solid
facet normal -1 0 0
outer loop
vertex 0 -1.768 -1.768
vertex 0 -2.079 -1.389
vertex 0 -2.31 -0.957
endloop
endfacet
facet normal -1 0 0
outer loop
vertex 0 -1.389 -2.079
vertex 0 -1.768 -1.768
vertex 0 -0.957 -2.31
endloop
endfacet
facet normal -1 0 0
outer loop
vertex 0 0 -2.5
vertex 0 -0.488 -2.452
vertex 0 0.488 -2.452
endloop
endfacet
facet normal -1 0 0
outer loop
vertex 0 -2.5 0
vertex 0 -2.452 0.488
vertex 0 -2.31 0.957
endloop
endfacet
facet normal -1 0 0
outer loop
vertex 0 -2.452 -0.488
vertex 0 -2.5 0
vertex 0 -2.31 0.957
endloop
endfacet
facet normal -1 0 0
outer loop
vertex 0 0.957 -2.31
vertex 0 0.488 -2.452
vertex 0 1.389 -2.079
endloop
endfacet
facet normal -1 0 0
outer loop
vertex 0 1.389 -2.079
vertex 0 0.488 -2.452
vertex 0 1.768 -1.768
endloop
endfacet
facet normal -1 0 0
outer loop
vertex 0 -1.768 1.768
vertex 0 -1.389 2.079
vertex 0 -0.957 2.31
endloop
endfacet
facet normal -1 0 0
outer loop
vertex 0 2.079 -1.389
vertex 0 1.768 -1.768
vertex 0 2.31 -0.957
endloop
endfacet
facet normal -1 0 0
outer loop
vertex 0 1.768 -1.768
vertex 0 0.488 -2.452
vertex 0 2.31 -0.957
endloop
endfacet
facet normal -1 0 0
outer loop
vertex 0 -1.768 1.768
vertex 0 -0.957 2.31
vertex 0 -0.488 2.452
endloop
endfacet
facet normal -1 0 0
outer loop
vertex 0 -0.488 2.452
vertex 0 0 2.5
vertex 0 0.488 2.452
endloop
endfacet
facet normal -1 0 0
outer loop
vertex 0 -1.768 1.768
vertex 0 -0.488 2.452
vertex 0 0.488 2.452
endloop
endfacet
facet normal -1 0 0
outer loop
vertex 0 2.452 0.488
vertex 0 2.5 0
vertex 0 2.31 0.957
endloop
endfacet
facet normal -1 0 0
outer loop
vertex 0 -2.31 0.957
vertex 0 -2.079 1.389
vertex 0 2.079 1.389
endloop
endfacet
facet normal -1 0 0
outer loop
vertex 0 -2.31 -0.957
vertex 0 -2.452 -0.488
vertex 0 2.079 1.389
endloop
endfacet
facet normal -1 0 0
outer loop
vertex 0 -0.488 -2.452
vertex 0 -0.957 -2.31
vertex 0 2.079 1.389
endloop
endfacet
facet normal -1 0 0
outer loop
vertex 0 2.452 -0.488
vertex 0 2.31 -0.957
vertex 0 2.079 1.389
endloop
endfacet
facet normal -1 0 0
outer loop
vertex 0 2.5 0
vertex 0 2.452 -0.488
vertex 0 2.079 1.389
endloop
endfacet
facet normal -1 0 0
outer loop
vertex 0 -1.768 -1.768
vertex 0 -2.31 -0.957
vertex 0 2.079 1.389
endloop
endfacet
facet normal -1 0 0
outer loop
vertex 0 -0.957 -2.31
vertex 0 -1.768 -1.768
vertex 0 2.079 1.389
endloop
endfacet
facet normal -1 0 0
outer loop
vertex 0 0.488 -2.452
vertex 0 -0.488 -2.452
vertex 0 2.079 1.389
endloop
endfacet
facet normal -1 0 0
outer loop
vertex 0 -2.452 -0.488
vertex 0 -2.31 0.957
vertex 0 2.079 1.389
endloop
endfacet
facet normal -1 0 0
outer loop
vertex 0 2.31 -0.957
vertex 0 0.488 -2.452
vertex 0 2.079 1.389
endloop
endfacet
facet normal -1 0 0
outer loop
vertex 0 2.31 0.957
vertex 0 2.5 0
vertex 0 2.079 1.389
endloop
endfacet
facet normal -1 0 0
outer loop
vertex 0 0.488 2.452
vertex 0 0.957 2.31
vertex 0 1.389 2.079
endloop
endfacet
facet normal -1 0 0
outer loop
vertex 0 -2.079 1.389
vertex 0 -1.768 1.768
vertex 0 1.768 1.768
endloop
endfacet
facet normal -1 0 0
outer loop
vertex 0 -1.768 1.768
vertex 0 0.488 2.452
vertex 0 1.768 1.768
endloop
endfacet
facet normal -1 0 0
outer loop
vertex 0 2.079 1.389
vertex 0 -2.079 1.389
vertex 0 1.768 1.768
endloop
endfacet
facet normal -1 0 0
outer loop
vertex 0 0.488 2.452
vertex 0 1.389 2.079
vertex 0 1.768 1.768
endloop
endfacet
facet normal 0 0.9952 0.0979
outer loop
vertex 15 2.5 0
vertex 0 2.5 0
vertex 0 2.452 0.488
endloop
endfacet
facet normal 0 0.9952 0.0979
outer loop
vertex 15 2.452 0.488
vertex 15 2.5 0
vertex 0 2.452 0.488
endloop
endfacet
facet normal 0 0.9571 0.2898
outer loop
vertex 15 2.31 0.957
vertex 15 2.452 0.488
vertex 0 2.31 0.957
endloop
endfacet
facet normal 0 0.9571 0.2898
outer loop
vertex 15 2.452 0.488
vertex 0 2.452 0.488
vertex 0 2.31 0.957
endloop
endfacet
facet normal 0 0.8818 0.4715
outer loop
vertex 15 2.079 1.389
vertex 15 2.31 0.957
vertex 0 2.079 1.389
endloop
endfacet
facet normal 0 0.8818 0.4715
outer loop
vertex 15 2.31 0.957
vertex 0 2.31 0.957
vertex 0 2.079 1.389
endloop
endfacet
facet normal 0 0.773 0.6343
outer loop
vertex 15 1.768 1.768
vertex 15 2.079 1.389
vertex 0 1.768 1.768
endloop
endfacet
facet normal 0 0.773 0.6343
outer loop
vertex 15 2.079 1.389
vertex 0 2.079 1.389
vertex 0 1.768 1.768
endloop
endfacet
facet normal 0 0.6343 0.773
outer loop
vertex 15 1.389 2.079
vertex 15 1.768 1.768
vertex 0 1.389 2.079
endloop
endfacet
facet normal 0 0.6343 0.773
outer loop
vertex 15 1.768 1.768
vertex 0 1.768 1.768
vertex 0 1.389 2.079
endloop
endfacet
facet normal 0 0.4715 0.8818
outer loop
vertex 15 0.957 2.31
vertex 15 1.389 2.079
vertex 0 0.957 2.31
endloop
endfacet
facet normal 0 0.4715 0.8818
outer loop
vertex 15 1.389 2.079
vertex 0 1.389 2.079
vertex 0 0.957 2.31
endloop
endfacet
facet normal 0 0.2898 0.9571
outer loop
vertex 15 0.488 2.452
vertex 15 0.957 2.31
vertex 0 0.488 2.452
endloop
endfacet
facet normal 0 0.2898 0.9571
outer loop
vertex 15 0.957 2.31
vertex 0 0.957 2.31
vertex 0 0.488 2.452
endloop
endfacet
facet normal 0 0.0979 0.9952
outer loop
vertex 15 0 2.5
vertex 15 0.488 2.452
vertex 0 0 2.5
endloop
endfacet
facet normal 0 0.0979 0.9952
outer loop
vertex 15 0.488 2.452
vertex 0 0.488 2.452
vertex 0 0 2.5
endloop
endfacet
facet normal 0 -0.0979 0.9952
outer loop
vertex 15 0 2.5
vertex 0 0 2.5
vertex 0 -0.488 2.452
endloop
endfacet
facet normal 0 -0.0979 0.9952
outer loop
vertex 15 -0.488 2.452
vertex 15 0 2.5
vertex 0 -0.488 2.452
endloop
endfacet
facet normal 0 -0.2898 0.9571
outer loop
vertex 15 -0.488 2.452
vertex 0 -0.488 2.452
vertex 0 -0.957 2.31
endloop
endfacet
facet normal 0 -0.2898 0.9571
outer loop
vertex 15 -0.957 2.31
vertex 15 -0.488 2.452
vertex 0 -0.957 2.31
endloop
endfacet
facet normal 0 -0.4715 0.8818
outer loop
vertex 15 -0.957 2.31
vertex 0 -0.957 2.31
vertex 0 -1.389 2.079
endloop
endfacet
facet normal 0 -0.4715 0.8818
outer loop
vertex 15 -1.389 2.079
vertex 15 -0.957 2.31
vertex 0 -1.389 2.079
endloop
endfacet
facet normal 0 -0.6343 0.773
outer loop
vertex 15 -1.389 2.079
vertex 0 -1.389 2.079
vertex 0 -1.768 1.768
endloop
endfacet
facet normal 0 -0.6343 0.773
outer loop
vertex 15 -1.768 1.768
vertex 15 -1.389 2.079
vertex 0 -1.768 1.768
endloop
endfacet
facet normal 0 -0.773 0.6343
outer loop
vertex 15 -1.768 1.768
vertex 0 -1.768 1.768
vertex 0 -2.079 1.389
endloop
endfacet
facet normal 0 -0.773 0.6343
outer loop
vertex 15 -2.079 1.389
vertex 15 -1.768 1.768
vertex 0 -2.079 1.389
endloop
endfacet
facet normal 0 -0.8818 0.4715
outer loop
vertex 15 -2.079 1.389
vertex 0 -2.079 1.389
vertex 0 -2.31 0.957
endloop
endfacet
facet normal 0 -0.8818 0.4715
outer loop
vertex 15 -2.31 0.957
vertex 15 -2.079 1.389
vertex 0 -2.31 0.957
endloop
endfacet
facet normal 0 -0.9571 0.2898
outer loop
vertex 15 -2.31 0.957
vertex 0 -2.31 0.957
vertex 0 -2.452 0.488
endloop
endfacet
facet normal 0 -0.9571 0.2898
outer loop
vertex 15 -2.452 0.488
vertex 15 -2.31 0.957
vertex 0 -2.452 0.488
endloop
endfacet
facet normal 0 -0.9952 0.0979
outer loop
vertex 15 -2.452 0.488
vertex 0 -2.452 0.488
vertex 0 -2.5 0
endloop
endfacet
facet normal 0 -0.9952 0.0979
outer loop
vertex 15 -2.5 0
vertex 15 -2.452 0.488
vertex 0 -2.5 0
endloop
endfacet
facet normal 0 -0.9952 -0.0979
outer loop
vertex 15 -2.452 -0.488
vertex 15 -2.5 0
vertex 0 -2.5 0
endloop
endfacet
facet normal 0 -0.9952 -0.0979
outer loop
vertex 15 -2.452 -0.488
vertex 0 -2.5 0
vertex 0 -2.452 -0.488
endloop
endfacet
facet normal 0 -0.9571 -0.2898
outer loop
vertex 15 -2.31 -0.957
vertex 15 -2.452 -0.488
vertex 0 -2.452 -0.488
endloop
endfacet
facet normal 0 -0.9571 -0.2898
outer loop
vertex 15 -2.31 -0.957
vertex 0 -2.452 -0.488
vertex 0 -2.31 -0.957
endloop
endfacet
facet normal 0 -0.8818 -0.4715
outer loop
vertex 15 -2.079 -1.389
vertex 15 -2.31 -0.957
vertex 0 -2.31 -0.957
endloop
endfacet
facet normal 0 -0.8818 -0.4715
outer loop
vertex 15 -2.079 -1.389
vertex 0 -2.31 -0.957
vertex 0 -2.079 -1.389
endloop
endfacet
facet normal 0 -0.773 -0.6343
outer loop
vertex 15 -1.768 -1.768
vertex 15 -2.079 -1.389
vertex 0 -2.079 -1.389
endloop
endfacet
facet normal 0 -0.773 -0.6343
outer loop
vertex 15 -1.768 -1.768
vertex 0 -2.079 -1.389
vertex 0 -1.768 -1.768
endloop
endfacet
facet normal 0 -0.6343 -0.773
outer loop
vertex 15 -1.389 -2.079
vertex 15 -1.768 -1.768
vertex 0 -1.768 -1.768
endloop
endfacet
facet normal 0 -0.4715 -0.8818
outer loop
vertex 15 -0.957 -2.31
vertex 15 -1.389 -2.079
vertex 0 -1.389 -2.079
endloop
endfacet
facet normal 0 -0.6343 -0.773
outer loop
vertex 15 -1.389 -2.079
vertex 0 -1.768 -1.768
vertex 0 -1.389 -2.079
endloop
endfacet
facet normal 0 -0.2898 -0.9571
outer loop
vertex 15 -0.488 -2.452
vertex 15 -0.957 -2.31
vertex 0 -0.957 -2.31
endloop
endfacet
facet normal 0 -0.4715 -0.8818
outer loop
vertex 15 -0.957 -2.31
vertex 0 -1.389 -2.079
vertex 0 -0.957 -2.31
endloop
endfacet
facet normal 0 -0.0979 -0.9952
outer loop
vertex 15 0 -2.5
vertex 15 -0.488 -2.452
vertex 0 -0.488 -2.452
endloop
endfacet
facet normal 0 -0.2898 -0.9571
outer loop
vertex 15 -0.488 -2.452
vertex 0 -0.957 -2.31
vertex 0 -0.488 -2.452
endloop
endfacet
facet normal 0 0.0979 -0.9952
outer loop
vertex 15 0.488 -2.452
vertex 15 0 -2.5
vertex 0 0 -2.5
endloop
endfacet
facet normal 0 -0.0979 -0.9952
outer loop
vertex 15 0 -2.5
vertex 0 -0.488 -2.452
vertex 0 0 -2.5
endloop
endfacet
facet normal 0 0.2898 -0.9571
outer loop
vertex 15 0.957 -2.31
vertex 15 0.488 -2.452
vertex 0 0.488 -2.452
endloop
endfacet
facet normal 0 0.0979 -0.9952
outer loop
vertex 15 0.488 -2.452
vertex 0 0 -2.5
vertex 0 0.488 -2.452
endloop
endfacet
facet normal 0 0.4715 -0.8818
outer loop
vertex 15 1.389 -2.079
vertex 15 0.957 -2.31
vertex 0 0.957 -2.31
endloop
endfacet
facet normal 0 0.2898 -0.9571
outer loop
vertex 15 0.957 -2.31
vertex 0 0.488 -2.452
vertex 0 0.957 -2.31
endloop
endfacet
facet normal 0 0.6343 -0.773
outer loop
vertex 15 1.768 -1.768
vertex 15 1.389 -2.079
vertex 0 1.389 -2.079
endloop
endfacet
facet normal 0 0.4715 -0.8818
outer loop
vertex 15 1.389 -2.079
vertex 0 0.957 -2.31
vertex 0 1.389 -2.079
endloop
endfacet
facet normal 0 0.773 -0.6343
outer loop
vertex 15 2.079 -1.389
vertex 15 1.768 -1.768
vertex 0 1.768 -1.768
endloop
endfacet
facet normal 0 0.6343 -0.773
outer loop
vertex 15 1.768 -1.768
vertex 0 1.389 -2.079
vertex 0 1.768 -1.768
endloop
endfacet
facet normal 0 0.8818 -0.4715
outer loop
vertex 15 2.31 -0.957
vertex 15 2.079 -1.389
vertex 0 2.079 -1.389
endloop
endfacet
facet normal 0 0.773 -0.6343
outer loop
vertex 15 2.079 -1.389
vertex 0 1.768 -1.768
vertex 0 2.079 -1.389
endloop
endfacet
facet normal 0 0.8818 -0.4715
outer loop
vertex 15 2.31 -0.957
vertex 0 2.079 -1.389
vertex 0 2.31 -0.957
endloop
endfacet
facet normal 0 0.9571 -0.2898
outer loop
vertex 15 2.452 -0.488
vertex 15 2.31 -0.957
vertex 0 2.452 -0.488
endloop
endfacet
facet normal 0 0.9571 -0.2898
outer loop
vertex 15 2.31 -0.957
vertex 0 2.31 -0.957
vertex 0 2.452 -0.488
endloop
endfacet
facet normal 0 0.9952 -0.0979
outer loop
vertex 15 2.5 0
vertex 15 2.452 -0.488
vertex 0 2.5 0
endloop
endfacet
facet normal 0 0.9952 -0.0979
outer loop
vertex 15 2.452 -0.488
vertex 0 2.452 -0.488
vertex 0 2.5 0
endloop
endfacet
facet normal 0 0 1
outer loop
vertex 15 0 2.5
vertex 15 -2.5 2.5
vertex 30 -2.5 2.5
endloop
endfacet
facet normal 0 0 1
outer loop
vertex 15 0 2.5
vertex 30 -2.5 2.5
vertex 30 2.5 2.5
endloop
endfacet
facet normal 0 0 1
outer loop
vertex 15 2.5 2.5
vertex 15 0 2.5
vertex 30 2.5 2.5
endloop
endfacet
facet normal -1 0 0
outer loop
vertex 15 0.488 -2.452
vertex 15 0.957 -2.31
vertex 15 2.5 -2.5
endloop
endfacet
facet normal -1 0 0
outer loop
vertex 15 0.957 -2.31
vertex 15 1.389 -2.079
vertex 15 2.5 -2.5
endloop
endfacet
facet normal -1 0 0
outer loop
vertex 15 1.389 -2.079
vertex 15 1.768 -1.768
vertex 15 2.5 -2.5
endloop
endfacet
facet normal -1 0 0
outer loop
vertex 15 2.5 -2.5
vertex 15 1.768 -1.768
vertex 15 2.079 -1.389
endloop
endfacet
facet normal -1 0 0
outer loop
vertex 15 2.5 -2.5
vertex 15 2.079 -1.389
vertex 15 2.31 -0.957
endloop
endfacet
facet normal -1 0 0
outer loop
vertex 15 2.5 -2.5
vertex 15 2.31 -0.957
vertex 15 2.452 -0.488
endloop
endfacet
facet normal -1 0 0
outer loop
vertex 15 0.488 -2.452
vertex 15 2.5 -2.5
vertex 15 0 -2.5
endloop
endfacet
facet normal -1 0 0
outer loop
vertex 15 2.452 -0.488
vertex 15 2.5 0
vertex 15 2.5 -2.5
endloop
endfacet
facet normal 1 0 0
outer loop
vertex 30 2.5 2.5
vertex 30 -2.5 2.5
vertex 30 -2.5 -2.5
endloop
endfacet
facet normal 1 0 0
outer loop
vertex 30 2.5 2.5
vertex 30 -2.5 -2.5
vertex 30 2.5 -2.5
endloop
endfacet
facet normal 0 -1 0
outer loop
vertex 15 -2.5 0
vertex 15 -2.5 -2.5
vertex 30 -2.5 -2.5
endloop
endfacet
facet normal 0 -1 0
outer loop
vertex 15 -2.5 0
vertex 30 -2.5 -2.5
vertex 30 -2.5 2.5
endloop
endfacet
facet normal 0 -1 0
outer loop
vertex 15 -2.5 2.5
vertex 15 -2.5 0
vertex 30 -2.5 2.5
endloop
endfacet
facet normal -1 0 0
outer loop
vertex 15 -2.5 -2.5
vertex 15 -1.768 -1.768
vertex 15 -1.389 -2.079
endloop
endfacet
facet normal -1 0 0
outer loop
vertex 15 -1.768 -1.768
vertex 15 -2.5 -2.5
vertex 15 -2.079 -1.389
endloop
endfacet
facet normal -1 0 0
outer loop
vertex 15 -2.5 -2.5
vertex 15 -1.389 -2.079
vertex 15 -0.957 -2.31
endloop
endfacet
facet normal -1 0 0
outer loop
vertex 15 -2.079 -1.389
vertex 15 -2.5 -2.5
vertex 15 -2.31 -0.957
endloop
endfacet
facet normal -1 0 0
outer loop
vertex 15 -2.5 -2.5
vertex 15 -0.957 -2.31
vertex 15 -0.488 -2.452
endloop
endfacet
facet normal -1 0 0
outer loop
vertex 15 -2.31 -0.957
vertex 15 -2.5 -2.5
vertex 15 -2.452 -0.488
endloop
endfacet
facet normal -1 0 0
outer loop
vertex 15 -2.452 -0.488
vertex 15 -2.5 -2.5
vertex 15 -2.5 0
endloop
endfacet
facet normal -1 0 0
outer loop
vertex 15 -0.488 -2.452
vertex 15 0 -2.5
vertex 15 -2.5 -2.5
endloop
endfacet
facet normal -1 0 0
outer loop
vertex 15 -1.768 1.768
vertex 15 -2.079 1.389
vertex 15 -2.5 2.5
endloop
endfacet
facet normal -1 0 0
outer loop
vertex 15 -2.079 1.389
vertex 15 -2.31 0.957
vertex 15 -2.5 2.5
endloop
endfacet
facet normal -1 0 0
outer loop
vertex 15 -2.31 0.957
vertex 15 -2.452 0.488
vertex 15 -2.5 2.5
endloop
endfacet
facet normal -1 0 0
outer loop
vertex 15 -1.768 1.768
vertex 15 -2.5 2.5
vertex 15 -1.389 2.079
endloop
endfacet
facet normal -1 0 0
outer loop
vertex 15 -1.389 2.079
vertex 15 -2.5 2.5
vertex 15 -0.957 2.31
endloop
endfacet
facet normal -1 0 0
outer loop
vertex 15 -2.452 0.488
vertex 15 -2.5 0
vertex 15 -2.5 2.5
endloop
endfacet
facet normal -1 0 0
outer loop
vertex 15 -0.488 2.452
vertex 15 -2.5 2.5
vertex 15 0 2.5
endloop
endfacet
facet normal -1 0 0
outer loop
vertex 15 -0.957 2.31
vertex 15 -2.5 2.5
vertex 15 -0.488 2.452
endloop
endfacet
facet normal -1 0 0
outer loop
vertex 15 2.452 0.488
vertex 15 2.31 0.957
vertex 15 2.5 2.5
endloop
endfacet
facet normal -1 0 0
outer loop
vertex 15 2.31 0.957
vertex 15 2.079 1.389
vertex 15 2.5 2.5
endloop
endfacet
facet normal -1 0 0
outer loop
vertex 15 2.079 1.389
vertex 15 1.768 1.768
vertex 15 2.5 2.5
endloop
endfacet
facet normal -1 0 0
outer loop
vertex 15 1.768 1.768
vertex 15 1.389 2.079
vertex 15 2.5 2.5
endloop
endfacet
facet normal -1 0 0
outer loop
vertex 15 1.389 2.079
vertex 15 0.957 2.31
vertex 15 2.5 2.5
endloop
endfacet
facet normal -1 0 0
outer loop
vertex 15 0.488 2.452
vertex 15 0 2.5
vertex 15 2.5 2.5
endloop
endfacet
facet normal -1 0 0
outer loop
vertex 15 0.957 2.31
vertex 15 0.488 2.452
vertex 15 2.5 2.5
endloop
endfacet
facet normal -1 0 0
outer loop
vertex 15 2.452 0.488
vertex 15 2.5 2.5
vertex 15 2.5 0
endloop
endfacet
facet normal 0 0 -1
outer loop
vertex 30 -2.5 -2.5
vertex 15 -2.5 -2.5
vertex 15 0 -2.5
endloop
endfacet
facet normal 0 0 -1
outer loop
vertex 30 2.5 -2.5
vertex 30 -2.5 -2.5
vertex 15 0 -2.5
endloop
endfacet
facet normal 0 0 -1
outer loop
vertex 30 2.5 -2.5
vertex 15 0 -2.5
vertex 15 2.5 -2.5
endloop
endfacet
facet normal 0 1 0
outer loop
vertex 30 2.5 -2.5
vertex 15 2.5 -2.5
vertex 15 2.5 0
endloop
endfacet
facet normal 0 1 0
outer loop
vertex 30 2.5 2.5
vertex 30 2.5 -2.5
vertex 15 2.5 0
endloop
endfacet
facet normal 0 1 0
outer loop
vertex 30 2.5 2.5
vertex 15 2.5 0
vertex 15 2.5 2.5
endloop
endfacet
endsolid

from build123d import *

# Parameters (mm, degrees)
F0_R     = 2.5
F1_DEPTH = 15
F2_W     = 5
F2_H     = 5
F3_DEPTH = 15


with BuildPart() as f1:
    # F0 (on Right) → F1 (new body)
    with BuildSketch(Plane.YZ):
        Circle(F0_R)
    extrude(amount=F1_DEPTH)

    # F2 (on face) → F3 (join)
    with BuildSketch(Plane.YZ.offset(15)):
        Rectangle(F2_W, F2_H)
    extrude(amount=F3_DEPTH)


solid = f1.part
